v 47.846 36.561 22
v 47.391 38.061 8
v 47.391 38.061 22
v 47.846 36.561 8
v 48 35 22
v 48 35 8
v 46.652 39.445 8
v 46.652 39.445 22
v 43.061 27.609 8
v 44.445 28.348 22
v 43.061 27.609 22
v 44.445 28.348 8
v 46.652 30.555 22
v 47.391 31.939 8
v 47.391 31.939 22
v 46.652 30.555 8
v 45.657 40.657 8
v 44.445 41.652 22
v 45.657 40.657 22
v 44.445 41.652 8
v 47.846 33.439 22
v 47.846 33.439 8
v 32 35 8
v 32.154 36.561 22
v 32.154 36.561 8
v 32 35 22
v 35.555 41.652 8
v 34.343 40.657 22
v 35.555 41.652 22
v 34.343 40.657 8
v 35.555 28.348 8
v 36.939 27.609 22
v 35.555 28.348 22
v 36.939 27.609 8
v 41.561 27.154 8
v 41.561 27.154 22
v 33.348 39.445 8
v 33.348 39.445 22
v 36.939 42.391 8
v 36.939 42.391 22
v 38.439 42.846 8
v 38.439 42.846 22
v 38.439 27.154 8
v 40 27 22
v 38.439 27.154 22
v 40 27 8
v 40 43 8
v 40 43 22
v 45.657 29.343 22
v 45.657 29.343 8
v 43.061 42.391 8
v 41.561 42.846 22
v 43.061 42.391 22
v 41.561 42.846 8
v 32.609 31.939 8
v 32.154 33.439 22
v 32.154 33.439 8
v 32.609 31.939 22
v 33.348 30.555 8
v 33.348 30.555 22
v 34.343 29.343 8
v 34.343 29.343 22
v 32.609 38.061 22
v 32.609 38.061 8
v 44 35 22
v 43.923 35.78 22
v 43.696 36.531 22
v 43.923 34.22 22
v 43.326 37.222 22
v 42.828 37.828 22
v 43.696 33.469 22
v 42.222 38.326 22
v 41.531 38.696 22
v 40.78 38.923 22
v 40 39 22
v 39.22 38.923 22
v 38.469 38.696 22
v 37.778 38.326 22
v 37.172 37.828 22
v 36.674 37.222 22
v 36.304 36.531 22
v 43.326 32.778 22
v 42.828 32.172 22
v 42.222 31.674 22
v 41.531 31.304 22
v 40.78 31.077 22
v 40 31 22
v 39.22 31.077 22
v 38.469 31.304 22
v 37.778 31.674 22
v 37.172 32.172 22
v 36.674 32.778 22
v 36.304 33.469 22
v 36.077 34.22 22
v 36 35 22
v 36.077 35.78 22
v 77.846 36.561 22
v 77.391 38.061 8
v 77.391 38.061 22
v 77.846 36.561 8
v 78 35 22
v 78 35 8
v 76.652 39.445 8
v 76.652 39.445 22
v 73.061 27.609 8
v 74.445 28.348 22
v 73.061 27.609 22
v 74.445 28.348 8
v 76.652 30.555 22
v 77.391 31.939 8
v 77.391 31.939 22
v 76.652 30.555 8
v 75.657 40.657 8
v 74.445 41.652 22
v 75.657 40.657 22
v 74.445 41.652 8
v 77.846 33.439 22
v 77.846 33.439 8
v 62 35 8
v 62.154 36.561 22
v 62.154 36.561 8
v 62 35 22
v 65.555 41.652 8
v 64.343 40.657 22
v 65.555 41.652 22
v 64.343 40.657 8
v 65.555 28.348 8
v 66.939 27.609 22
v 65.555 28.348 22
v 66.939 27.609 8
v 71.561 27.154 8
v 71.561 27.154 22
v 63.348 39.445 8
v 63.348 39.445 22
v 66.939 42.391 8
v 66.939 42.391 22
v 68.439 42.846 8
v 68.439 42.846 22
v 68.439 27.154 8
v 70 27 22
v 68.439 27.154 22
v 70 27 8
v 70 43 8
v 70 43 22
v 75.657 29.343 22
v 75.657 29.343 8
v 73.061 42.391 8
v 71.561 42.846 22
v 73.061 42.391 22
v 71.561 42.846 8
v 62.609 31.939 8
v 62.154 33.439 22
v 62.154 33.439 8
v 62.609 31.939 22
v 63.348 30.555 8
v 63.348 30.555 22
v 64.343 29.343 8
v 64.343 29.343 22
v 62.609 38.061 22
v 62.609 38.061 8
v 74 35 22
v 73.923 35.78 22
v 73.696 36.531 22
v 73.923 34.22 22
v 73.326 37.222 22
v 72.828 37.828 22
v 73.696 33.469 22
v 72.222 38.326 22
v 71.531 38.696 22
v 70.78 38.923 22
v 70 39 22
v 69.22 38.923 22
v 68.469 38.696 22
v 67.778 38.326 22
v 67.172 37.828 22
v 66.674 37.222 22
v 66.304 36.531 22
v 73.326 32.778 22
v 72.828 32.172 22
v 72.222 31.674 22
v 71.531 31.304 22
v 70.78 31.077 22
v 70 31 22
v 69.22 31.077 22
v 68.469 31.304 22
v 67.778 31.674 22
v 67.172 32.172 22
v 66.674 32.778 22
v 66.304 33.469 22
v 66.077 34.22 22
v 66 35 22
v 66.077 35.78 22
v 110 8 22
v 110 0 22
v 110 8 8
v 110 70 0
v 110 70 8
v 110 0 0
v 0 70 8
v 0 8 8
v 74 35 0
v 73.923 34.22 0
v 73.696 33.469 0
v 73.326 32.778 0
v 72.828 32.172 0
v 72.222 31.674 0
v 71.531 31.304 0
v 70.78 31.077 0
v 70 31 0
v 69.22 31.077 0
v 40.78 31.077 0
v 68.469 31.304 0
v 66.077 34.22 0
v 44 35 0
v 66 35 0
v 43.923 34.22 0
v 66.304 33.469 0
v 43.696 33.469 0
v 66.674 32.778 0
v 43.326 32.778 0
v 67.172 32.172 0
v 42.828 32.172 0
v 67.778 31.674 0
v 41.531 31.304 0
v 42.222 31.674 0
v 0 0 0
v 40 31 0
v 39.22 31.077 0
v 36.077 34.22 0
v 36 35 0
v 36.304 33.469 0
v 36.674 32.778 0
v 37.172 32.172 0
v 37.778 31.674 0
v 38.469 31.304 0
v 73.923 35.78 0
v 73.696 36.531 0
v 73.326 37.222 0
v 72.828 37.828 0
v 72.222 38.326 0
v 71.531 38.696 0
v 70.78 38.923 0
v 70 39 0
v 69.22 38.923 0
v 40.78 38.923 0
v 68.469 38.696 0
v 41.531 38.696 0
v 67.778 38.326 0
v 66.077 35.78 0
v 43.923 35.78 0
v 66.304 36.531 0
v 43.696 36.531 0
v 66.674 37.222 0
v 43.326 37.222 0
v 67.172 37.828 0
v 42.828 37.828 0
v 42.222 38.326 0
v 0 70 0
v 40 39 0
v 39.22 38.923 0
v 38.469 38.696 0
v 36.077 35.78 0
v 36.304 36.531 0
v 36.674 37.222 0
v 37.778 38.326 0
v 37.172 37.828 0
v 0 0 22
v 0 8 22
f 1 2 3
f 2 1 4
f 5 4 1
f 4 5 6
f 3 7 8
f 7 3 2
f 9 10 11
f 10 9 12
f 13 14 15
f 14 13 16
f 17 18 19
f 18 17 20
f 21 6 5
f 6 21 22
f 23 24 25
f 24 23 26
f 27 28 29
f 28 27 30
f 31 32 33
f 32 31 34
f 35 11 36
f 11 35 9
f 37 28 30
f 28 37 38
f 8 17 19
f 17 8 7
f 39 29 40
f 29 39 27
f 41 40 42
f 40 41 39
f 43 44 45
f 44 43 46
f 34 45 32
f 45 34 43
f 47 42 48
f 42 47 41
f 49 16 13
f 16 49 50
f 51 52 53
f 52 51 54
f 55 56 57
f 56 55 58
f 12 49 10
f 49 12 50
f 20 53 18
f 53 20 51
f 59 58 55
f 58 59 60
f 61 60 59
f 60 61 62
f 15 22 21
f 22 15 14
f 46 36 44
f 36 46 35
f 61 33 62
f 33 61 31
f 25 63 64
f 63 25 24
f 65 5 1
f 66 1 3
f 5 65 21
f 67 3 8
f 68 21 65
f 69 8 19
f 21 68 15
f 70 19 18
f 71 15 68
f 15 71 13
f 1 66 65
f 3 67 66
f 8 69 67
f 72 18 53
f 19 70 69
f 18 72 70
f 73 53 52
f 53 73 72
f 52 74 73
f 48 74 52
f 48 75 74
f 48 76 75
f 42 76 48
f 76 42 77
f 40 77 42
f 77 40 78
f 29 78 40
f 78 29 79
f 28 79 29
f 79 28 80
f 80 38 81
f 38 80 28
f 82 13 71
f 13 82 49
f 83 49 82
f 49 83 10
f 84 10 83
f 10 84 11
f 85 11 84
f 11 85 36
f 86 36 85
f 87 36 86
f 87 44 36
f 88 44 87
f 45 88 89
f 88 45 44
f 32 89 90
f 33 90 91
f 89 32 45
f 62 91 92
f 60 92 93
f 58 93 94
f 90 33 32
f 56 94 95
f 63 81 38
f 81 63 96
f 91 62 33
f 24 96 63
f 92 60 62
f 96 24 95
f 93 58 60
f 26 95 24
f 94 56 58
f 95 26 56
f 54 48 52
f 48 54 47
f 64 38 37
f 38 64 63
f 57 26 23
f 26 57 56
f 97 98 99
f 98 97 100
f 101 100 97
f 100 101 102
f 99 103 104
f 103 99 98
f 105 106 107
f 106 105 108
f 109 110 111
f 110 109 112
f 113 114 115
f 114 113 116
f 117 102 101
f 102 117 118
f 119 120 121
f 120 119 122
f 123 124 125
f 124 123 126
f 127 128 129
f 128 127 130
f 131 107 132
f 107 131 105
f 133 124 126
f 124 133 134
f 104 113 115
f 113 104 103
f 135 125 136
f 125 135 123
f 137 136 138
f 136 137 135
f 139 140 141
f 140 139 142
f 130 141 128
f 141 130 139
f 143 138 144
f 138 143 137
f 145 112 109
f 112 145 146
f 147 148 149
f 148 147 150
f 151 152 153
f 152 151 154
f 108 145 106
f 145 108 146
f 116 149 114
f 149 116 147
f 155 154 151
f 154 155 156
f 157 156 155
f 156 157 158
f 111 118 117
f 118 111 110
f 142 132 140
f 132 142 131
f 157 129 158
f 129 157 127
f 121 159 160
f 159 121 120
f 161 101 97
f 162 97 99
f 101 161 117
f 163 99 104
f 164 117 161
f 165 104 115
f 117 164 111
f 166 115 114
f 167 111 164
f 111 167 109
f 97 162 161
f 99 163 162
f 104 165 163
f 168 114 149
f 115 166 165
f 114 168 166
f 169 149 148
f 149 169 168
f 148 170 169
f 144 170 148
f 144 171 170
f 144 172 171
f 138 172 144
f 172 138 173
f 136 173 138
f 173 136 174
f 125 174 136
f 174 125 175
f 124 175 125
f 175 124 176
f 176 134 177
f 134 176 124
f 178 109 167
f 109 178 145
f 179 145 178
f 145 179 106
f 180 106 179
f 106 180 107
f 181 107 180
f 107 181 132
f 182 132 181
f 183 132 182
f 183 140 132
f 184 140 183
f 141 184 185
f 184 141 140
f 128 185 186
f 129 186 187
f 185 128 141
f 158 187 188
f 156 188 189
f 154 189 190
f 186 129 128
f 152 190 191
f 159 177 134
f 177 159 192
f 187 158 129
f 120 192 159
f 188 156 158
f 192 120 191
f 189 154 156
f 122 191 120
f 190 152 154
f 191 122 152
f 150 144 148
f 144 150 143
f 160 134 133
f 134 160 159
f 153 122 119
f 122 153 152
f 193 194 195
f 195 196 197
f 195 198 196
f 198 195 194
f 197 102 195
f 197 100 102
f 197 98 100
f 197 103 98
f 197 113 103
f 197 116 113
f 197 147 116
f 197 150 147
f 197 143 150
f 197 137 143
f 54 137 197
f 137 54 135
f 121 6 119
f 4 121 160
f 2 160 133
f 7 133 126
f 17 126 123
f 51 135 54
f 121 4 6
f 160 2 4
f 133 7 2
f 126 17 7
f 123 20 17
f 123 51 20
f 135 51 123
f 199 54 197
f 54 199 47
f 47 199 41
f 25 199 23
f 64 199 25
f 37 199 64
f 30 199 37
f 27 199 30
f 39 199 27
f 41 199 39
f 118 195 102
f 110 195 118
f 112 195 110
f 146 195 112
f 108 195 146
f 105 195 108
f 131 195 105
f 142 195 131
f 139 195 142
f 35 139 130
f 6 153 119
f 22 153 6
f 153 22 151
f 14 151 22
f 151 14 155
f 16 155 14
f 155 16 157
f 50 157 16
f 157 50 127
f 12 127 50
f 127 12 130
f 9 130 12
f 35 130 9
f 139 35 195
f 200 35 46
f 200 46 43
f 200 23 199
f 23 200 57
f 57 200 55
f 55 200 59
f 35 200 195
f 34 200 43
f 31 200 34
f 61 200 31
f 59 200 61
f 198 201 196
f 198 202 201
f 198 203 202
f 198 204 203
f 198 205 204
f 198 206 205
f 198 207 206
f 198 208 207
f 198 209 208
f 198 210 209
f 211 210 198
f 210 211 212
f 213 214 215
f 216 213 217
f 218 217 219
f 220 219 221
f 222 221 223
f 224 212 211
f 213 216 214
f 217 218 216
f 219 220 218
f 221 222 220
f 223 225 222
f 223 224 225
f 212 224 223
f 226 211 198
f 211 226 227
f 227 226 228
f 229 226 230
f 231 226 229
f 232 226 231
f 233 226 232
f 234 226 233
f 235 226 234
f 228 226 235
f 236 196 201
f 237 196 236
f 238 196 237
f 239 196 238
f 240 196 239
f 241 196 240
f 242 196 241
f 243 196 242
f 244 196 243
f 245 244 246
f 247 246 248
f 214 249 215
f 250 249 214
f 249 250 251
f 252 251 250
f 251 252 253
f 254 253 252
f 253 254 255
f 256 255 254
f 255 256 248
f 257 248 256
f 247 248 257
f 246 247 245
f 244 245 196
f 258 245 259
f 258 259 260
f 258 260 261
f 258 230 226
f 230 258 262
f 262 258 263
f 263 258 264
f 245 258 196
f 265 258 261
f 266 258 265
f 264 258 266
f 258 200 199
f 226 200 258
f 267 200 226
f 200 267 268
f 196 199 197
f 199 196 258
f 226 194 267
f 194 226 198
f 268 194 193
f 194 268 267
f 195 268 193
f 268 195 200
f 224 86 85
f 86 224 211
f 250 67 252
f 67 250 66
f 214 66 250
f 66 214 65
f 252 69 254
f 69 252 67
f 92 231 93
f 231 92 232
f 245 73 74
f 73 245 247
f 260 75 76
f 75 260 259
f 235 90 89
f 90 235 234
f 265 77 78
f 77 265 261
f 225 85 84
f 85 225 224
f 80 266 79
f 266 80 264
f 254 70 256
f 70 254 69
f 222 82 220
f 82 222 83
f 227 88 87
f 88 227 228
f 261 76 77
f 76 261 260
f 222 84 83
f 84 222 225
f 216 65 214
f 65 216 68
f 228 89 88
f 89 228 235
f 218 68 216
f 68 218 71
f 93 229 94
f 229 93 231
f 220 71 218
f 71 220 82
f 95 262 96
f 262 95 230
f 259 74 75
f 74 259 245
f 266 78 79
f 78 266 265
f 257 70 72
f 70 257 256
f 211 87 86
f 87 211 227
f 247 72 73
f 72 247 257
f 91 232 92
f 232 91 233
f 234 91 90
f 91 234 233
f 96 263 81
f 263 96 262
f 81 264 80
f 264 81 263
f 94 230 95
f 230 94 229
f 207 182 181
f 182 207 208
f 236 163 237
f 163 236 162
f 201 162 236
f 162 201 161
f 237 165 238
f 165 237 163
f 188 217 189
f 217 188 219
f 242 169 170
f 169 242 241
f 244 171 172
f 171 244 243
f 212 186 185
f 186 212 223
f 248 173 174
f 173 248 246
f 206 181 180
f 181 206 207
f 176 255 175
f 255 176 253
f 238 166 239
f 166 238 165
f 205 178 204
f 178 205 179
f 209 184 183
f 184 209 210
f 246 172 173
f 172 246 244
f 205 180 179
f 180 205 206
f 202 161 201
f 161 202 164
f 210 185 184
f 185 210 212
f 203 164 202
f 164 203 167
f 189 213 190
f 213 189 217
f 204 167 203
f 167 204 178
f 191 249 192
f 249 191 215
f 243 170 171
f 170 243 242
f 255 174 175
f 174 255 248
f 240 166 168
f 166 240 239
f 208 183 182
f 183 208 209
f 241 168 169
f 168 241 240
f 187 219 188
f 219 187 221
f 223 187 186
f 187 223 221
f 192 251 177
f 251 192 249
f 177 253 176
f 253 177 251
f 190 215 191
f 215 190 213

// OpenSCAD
$fn = 32;

// ----------------------------------------------------------------------
// Drill jig: fence jig
// ----------------------------------------------------------------------

// --- parameters (mm) ---
plate_l = 110;            // plate length, X
plate_w = 70;             // plate width, Y
plate_t = 8;              // plate thickness
boss_d = 16;              // guide boss diameter
boss_h = 15;              // boss height above the plate
guide_d = 8;              // guide hole diameter
boss_pitch = 30;          // boss pitch
fence_h = 15;             // fence height above the plate
fence_t = 8;              // fence thickness

n_boss = 2;  // guide bosses
boss_x0 = (plate_l - (n_boss - 1) * boss_pitch) / 2;  // first boss X
boss_top = plate_t - 1 + boss_h;  // boss crown height
fence_top = plate_t - 1 + fence_h;  // fence crown height
total_h = max([fence_top, boss_top]);  // overall height

difference() {
  union() {
  cube([plate_l, plate_w, plate_t]);
  for (i = [0 : n_boss - 1])
    translate([boss_x0 + i * boss_pitch, plate_w / 2, plate_t - 1])
      cylinder(h = boss_h, d = boss_d);
  translate([0, 0, plate_t - 1]) cube([plate_l, fence_t, fence_h]);
  }
  for (i = [0 : n_boss - 1])
    translate([boss_x0 + i * boss_pitch, plate_w / 2, -1])
      cylinder(h = plate_t + boss_h, d = guide_d);
}
